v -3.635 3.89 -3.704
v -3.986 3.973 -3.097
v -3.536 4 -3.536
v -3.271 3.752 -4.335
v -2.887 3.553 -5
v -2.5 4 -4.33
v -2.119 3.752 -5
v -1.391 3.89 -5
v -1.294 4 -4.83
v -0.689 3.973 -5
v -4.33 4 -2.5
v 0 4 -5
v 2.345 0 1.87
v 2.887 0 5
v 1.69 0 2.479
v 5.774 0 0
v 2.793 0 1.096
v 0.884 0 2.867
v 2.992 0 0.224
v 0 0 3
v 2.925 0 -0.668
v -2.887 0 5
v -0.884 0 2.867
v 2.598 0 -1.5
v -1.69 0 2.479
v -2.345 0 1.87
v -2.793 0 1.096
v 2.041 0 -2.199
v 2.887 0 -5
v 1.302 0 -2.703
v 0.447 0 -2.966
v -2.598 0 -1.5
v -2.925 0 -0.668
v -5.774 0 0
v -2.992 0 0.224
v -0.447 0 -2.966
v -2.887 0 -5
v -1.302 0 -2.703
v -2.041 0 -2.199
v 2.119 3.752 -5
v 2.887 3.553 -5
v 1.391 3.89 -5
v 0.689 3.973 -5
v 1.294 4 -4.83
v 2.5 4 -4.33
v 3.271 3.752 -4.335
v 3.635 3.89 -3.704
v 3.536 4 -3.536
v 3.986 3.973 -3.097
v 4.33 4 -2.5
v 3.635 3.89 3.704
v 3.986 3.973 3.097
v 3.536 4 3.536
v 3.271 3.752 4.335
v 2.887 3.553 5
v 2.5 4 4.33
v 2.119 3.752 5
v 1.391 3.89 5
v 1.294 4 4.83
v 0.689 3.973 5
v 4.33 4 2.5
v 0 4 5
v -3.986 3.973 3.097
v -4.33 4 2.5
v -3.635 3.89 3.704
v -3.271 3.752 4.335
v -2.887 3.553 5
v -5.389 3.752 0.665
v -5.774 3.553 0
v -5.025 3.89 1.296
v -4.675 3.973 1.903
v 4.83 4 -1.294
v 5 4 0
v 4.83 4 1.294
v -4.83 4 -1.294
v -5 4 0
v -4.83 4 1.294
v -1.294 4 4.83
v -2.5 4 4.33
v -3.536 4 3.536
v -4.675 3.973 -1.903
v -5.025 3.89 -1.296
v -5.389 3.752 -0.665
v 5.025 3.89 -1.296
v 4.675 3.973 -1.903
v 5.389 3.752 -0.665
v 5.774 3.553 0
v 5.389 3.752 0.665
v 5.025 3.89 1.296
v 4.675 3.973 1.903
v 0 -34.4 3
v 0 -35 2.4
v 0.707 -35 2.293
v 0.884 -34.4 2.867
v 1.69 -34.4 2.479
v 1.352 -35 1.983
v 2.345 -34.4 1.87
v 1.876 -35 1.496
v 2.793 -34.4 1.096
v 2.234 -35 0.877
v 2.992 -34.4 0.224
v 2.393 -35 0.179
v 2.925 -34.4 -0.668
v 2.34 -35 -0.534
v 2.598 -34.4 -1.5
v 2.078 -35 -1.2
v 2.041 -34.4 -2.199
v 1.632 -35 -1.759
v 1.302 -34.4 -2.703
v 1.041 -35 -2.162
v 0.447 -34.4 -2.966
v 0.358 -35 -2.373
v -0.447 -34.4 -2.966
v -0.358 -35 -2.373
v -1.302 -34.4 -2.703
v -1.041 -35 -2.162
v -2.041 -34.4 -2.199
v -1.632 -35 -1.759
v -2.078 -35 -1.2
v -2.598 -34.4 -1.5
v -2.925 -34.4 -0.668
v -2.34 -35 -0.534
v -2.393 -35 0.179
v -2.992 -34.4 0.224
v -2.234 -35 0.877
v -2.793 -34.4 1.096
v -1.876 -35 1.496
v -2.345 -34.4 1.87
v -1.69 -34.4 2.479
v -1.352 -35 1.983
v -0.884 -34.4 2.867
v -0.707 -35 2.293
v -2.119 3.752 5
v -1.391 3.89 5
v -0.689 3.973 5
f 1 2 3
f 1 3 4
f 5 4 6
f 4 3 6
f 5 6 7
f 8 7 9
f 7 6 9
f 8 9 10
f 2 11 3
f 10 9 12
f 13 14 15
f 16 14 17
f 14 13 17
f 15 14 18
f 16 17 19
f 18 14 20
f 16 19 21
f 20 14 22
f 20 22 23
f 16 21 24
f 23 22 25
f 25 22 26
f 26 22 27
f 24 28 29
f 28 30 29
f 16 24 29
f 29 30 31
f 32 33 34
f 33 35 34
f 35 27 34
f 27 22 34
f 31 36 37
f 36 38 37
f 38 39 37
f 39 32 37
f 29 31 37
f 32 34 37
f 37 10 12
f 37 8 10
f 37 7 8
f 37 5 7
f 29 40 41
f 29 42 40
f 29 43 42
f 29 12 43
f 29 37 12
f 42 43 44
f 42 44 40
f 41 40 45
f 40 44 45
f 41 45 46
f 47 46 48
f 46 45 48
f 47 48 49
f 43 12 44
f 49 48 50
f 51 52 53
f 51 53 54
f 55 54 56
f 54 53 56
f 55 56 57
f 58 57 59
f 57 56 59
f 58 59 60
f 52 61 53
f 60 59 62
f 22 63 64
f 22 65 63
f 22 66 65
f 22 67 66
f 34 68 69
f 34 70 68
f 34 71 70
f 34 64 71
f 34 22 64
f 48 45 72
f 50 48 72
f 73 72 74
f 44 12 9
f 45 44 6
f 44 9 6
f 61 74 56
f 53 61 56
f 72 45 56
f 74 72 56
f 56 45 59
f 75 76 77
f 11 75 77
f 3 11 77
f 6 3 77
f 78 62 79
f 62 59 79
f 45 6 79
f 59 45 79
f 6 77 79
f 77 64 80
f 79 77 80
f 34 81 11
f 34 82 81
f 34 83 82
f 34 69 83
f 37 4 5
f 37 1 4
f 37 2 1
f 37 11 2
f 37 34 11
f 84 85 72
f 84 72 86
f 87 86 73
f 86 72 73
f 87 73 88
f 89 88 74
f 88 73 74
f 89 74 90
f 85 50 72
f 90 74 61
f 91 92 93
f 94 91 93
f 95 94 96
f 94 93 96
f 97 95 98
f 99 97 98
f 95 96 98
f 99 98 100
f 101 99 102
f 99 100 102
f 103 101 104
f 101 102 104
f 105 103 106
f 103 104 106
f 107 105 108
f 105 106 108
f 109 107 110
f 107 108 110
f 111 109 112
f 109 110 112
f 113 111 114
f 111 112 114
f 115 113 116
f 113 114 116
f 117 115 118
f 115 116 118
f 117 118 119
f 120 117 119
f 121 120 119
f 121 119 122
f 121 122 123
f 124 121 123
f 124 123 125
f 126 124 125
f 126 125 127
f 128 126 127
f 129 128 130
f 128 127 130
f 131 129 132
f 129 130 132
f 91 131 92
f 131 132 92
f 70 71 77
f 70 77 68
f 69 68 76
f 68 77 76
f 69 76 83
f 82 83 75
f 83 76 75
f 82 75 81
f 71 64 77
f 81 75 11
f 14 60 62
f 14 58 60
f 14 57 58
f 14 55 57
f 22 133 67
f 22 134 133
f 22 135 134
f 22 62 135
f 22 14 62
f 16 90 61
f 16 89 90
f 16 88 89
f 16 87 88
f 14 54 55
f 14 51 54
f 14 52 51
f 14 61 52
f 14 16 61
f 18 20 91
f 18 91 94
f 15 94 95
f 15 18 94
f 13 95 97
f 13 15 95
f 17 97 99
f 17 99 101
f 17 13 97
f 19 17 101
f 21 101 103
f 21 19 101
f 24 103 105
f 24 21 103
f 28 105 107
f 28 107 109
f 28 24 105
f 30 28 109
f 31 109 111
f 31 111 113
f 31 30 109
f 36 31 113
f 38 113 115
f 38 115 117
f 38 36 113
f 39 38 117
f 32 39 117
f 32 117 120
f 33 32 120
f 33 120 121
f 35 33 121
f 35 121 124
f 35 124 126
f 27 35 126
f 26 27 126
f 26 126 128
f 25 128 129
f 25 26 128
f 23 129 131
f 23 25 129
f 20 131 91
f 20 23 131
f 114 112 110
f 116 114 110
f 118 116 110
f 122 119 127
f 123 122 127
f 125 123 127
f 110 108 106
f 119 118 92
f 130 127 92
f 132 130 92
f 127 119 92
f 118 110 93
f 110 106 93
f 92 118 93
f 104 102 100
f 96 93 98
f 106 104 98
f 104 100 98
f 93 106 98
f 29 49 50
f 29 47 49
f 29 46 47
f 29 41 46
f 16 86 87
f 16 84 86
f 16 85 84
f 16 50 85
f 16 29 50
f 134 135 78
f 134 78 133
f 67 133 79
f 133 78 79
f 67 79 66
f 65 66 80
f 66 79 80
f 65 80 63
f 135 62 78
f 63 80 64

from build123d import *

# Parameters (mm, degrees)
ESQUISSE2_R             = 3
BASE_EXTRUSION_DEPTH    = 35
CHANFREIN1_SIZE         = 0.6
ESQUISSE6_OUTSIDE_W     = 24.908
ESQUISSE6_OUTSIDE_H     = 24.908
ENL_V_MAT_EXTRU_1_DEPTH = 4


with BuildPart() as part:
    # Esquisse2 → Base-Extrusion (new body)
    with BuildSketch(Plane(origin=(0, 0, 0), x_dir=(1, 0, 0), z_dir=(0, 1, 0))):
        with Locations(Location((0, 0, 0), (0, 0, 270))):  # turned: the seam where the file's is
            Circle(ESQUISSE2_R)
    extrude(amount=-BASE_EXTRUSION_DEPTH)

    # Chanfrein1
    chanfrein1_edges = [part.edges().sort_by_distance(p)[0] for p in [
        (0, -35, -3),
    ]]
    chamfer(chanfrein1_edges, length=CHANFREIN1_SIZE)

    # Esquisse5 → Boss.-Révol.1 (revolve)
    with BuildSketch(Plane.XY, mode=Mode.PRIVATE) as boss_r_vol_1_sk:
        Polygon((0, 0), (7.071067812, 0), (7.071067812, 2.804268441), (5, 4), (0, 4), align=None)
    revolve(boss_r_vol_1_sk.sketch.rotate(Axis((0, 4, 0), (0, -1, 0)), 90), axis=Axis((0, 4, 0), (0, -1, 0)))  # turned: the seam where the file's is

    # Esquisse6 outside → Enlèv. mat.-Extru.1 (cut)
    with BuildSketch(Plane.XZ):
        Rectangle(ESQUISSE6_OUTSIDE_W, ESQUISSE6_OUTSIDE_H)
        Polygon((-2.886751346, -5), (2.886751346, -5), (5.773502692, 0), (2.886751346, 5), (-2.886751346, 5), (-5.773502692, 0), align=None, mode=Mode.SUBTRACT)
    extrude(amount=-ENL_V_MAT_EXTRU_1_DEPTH, mode=Mode.SUBTRACT)


solid = part.part
